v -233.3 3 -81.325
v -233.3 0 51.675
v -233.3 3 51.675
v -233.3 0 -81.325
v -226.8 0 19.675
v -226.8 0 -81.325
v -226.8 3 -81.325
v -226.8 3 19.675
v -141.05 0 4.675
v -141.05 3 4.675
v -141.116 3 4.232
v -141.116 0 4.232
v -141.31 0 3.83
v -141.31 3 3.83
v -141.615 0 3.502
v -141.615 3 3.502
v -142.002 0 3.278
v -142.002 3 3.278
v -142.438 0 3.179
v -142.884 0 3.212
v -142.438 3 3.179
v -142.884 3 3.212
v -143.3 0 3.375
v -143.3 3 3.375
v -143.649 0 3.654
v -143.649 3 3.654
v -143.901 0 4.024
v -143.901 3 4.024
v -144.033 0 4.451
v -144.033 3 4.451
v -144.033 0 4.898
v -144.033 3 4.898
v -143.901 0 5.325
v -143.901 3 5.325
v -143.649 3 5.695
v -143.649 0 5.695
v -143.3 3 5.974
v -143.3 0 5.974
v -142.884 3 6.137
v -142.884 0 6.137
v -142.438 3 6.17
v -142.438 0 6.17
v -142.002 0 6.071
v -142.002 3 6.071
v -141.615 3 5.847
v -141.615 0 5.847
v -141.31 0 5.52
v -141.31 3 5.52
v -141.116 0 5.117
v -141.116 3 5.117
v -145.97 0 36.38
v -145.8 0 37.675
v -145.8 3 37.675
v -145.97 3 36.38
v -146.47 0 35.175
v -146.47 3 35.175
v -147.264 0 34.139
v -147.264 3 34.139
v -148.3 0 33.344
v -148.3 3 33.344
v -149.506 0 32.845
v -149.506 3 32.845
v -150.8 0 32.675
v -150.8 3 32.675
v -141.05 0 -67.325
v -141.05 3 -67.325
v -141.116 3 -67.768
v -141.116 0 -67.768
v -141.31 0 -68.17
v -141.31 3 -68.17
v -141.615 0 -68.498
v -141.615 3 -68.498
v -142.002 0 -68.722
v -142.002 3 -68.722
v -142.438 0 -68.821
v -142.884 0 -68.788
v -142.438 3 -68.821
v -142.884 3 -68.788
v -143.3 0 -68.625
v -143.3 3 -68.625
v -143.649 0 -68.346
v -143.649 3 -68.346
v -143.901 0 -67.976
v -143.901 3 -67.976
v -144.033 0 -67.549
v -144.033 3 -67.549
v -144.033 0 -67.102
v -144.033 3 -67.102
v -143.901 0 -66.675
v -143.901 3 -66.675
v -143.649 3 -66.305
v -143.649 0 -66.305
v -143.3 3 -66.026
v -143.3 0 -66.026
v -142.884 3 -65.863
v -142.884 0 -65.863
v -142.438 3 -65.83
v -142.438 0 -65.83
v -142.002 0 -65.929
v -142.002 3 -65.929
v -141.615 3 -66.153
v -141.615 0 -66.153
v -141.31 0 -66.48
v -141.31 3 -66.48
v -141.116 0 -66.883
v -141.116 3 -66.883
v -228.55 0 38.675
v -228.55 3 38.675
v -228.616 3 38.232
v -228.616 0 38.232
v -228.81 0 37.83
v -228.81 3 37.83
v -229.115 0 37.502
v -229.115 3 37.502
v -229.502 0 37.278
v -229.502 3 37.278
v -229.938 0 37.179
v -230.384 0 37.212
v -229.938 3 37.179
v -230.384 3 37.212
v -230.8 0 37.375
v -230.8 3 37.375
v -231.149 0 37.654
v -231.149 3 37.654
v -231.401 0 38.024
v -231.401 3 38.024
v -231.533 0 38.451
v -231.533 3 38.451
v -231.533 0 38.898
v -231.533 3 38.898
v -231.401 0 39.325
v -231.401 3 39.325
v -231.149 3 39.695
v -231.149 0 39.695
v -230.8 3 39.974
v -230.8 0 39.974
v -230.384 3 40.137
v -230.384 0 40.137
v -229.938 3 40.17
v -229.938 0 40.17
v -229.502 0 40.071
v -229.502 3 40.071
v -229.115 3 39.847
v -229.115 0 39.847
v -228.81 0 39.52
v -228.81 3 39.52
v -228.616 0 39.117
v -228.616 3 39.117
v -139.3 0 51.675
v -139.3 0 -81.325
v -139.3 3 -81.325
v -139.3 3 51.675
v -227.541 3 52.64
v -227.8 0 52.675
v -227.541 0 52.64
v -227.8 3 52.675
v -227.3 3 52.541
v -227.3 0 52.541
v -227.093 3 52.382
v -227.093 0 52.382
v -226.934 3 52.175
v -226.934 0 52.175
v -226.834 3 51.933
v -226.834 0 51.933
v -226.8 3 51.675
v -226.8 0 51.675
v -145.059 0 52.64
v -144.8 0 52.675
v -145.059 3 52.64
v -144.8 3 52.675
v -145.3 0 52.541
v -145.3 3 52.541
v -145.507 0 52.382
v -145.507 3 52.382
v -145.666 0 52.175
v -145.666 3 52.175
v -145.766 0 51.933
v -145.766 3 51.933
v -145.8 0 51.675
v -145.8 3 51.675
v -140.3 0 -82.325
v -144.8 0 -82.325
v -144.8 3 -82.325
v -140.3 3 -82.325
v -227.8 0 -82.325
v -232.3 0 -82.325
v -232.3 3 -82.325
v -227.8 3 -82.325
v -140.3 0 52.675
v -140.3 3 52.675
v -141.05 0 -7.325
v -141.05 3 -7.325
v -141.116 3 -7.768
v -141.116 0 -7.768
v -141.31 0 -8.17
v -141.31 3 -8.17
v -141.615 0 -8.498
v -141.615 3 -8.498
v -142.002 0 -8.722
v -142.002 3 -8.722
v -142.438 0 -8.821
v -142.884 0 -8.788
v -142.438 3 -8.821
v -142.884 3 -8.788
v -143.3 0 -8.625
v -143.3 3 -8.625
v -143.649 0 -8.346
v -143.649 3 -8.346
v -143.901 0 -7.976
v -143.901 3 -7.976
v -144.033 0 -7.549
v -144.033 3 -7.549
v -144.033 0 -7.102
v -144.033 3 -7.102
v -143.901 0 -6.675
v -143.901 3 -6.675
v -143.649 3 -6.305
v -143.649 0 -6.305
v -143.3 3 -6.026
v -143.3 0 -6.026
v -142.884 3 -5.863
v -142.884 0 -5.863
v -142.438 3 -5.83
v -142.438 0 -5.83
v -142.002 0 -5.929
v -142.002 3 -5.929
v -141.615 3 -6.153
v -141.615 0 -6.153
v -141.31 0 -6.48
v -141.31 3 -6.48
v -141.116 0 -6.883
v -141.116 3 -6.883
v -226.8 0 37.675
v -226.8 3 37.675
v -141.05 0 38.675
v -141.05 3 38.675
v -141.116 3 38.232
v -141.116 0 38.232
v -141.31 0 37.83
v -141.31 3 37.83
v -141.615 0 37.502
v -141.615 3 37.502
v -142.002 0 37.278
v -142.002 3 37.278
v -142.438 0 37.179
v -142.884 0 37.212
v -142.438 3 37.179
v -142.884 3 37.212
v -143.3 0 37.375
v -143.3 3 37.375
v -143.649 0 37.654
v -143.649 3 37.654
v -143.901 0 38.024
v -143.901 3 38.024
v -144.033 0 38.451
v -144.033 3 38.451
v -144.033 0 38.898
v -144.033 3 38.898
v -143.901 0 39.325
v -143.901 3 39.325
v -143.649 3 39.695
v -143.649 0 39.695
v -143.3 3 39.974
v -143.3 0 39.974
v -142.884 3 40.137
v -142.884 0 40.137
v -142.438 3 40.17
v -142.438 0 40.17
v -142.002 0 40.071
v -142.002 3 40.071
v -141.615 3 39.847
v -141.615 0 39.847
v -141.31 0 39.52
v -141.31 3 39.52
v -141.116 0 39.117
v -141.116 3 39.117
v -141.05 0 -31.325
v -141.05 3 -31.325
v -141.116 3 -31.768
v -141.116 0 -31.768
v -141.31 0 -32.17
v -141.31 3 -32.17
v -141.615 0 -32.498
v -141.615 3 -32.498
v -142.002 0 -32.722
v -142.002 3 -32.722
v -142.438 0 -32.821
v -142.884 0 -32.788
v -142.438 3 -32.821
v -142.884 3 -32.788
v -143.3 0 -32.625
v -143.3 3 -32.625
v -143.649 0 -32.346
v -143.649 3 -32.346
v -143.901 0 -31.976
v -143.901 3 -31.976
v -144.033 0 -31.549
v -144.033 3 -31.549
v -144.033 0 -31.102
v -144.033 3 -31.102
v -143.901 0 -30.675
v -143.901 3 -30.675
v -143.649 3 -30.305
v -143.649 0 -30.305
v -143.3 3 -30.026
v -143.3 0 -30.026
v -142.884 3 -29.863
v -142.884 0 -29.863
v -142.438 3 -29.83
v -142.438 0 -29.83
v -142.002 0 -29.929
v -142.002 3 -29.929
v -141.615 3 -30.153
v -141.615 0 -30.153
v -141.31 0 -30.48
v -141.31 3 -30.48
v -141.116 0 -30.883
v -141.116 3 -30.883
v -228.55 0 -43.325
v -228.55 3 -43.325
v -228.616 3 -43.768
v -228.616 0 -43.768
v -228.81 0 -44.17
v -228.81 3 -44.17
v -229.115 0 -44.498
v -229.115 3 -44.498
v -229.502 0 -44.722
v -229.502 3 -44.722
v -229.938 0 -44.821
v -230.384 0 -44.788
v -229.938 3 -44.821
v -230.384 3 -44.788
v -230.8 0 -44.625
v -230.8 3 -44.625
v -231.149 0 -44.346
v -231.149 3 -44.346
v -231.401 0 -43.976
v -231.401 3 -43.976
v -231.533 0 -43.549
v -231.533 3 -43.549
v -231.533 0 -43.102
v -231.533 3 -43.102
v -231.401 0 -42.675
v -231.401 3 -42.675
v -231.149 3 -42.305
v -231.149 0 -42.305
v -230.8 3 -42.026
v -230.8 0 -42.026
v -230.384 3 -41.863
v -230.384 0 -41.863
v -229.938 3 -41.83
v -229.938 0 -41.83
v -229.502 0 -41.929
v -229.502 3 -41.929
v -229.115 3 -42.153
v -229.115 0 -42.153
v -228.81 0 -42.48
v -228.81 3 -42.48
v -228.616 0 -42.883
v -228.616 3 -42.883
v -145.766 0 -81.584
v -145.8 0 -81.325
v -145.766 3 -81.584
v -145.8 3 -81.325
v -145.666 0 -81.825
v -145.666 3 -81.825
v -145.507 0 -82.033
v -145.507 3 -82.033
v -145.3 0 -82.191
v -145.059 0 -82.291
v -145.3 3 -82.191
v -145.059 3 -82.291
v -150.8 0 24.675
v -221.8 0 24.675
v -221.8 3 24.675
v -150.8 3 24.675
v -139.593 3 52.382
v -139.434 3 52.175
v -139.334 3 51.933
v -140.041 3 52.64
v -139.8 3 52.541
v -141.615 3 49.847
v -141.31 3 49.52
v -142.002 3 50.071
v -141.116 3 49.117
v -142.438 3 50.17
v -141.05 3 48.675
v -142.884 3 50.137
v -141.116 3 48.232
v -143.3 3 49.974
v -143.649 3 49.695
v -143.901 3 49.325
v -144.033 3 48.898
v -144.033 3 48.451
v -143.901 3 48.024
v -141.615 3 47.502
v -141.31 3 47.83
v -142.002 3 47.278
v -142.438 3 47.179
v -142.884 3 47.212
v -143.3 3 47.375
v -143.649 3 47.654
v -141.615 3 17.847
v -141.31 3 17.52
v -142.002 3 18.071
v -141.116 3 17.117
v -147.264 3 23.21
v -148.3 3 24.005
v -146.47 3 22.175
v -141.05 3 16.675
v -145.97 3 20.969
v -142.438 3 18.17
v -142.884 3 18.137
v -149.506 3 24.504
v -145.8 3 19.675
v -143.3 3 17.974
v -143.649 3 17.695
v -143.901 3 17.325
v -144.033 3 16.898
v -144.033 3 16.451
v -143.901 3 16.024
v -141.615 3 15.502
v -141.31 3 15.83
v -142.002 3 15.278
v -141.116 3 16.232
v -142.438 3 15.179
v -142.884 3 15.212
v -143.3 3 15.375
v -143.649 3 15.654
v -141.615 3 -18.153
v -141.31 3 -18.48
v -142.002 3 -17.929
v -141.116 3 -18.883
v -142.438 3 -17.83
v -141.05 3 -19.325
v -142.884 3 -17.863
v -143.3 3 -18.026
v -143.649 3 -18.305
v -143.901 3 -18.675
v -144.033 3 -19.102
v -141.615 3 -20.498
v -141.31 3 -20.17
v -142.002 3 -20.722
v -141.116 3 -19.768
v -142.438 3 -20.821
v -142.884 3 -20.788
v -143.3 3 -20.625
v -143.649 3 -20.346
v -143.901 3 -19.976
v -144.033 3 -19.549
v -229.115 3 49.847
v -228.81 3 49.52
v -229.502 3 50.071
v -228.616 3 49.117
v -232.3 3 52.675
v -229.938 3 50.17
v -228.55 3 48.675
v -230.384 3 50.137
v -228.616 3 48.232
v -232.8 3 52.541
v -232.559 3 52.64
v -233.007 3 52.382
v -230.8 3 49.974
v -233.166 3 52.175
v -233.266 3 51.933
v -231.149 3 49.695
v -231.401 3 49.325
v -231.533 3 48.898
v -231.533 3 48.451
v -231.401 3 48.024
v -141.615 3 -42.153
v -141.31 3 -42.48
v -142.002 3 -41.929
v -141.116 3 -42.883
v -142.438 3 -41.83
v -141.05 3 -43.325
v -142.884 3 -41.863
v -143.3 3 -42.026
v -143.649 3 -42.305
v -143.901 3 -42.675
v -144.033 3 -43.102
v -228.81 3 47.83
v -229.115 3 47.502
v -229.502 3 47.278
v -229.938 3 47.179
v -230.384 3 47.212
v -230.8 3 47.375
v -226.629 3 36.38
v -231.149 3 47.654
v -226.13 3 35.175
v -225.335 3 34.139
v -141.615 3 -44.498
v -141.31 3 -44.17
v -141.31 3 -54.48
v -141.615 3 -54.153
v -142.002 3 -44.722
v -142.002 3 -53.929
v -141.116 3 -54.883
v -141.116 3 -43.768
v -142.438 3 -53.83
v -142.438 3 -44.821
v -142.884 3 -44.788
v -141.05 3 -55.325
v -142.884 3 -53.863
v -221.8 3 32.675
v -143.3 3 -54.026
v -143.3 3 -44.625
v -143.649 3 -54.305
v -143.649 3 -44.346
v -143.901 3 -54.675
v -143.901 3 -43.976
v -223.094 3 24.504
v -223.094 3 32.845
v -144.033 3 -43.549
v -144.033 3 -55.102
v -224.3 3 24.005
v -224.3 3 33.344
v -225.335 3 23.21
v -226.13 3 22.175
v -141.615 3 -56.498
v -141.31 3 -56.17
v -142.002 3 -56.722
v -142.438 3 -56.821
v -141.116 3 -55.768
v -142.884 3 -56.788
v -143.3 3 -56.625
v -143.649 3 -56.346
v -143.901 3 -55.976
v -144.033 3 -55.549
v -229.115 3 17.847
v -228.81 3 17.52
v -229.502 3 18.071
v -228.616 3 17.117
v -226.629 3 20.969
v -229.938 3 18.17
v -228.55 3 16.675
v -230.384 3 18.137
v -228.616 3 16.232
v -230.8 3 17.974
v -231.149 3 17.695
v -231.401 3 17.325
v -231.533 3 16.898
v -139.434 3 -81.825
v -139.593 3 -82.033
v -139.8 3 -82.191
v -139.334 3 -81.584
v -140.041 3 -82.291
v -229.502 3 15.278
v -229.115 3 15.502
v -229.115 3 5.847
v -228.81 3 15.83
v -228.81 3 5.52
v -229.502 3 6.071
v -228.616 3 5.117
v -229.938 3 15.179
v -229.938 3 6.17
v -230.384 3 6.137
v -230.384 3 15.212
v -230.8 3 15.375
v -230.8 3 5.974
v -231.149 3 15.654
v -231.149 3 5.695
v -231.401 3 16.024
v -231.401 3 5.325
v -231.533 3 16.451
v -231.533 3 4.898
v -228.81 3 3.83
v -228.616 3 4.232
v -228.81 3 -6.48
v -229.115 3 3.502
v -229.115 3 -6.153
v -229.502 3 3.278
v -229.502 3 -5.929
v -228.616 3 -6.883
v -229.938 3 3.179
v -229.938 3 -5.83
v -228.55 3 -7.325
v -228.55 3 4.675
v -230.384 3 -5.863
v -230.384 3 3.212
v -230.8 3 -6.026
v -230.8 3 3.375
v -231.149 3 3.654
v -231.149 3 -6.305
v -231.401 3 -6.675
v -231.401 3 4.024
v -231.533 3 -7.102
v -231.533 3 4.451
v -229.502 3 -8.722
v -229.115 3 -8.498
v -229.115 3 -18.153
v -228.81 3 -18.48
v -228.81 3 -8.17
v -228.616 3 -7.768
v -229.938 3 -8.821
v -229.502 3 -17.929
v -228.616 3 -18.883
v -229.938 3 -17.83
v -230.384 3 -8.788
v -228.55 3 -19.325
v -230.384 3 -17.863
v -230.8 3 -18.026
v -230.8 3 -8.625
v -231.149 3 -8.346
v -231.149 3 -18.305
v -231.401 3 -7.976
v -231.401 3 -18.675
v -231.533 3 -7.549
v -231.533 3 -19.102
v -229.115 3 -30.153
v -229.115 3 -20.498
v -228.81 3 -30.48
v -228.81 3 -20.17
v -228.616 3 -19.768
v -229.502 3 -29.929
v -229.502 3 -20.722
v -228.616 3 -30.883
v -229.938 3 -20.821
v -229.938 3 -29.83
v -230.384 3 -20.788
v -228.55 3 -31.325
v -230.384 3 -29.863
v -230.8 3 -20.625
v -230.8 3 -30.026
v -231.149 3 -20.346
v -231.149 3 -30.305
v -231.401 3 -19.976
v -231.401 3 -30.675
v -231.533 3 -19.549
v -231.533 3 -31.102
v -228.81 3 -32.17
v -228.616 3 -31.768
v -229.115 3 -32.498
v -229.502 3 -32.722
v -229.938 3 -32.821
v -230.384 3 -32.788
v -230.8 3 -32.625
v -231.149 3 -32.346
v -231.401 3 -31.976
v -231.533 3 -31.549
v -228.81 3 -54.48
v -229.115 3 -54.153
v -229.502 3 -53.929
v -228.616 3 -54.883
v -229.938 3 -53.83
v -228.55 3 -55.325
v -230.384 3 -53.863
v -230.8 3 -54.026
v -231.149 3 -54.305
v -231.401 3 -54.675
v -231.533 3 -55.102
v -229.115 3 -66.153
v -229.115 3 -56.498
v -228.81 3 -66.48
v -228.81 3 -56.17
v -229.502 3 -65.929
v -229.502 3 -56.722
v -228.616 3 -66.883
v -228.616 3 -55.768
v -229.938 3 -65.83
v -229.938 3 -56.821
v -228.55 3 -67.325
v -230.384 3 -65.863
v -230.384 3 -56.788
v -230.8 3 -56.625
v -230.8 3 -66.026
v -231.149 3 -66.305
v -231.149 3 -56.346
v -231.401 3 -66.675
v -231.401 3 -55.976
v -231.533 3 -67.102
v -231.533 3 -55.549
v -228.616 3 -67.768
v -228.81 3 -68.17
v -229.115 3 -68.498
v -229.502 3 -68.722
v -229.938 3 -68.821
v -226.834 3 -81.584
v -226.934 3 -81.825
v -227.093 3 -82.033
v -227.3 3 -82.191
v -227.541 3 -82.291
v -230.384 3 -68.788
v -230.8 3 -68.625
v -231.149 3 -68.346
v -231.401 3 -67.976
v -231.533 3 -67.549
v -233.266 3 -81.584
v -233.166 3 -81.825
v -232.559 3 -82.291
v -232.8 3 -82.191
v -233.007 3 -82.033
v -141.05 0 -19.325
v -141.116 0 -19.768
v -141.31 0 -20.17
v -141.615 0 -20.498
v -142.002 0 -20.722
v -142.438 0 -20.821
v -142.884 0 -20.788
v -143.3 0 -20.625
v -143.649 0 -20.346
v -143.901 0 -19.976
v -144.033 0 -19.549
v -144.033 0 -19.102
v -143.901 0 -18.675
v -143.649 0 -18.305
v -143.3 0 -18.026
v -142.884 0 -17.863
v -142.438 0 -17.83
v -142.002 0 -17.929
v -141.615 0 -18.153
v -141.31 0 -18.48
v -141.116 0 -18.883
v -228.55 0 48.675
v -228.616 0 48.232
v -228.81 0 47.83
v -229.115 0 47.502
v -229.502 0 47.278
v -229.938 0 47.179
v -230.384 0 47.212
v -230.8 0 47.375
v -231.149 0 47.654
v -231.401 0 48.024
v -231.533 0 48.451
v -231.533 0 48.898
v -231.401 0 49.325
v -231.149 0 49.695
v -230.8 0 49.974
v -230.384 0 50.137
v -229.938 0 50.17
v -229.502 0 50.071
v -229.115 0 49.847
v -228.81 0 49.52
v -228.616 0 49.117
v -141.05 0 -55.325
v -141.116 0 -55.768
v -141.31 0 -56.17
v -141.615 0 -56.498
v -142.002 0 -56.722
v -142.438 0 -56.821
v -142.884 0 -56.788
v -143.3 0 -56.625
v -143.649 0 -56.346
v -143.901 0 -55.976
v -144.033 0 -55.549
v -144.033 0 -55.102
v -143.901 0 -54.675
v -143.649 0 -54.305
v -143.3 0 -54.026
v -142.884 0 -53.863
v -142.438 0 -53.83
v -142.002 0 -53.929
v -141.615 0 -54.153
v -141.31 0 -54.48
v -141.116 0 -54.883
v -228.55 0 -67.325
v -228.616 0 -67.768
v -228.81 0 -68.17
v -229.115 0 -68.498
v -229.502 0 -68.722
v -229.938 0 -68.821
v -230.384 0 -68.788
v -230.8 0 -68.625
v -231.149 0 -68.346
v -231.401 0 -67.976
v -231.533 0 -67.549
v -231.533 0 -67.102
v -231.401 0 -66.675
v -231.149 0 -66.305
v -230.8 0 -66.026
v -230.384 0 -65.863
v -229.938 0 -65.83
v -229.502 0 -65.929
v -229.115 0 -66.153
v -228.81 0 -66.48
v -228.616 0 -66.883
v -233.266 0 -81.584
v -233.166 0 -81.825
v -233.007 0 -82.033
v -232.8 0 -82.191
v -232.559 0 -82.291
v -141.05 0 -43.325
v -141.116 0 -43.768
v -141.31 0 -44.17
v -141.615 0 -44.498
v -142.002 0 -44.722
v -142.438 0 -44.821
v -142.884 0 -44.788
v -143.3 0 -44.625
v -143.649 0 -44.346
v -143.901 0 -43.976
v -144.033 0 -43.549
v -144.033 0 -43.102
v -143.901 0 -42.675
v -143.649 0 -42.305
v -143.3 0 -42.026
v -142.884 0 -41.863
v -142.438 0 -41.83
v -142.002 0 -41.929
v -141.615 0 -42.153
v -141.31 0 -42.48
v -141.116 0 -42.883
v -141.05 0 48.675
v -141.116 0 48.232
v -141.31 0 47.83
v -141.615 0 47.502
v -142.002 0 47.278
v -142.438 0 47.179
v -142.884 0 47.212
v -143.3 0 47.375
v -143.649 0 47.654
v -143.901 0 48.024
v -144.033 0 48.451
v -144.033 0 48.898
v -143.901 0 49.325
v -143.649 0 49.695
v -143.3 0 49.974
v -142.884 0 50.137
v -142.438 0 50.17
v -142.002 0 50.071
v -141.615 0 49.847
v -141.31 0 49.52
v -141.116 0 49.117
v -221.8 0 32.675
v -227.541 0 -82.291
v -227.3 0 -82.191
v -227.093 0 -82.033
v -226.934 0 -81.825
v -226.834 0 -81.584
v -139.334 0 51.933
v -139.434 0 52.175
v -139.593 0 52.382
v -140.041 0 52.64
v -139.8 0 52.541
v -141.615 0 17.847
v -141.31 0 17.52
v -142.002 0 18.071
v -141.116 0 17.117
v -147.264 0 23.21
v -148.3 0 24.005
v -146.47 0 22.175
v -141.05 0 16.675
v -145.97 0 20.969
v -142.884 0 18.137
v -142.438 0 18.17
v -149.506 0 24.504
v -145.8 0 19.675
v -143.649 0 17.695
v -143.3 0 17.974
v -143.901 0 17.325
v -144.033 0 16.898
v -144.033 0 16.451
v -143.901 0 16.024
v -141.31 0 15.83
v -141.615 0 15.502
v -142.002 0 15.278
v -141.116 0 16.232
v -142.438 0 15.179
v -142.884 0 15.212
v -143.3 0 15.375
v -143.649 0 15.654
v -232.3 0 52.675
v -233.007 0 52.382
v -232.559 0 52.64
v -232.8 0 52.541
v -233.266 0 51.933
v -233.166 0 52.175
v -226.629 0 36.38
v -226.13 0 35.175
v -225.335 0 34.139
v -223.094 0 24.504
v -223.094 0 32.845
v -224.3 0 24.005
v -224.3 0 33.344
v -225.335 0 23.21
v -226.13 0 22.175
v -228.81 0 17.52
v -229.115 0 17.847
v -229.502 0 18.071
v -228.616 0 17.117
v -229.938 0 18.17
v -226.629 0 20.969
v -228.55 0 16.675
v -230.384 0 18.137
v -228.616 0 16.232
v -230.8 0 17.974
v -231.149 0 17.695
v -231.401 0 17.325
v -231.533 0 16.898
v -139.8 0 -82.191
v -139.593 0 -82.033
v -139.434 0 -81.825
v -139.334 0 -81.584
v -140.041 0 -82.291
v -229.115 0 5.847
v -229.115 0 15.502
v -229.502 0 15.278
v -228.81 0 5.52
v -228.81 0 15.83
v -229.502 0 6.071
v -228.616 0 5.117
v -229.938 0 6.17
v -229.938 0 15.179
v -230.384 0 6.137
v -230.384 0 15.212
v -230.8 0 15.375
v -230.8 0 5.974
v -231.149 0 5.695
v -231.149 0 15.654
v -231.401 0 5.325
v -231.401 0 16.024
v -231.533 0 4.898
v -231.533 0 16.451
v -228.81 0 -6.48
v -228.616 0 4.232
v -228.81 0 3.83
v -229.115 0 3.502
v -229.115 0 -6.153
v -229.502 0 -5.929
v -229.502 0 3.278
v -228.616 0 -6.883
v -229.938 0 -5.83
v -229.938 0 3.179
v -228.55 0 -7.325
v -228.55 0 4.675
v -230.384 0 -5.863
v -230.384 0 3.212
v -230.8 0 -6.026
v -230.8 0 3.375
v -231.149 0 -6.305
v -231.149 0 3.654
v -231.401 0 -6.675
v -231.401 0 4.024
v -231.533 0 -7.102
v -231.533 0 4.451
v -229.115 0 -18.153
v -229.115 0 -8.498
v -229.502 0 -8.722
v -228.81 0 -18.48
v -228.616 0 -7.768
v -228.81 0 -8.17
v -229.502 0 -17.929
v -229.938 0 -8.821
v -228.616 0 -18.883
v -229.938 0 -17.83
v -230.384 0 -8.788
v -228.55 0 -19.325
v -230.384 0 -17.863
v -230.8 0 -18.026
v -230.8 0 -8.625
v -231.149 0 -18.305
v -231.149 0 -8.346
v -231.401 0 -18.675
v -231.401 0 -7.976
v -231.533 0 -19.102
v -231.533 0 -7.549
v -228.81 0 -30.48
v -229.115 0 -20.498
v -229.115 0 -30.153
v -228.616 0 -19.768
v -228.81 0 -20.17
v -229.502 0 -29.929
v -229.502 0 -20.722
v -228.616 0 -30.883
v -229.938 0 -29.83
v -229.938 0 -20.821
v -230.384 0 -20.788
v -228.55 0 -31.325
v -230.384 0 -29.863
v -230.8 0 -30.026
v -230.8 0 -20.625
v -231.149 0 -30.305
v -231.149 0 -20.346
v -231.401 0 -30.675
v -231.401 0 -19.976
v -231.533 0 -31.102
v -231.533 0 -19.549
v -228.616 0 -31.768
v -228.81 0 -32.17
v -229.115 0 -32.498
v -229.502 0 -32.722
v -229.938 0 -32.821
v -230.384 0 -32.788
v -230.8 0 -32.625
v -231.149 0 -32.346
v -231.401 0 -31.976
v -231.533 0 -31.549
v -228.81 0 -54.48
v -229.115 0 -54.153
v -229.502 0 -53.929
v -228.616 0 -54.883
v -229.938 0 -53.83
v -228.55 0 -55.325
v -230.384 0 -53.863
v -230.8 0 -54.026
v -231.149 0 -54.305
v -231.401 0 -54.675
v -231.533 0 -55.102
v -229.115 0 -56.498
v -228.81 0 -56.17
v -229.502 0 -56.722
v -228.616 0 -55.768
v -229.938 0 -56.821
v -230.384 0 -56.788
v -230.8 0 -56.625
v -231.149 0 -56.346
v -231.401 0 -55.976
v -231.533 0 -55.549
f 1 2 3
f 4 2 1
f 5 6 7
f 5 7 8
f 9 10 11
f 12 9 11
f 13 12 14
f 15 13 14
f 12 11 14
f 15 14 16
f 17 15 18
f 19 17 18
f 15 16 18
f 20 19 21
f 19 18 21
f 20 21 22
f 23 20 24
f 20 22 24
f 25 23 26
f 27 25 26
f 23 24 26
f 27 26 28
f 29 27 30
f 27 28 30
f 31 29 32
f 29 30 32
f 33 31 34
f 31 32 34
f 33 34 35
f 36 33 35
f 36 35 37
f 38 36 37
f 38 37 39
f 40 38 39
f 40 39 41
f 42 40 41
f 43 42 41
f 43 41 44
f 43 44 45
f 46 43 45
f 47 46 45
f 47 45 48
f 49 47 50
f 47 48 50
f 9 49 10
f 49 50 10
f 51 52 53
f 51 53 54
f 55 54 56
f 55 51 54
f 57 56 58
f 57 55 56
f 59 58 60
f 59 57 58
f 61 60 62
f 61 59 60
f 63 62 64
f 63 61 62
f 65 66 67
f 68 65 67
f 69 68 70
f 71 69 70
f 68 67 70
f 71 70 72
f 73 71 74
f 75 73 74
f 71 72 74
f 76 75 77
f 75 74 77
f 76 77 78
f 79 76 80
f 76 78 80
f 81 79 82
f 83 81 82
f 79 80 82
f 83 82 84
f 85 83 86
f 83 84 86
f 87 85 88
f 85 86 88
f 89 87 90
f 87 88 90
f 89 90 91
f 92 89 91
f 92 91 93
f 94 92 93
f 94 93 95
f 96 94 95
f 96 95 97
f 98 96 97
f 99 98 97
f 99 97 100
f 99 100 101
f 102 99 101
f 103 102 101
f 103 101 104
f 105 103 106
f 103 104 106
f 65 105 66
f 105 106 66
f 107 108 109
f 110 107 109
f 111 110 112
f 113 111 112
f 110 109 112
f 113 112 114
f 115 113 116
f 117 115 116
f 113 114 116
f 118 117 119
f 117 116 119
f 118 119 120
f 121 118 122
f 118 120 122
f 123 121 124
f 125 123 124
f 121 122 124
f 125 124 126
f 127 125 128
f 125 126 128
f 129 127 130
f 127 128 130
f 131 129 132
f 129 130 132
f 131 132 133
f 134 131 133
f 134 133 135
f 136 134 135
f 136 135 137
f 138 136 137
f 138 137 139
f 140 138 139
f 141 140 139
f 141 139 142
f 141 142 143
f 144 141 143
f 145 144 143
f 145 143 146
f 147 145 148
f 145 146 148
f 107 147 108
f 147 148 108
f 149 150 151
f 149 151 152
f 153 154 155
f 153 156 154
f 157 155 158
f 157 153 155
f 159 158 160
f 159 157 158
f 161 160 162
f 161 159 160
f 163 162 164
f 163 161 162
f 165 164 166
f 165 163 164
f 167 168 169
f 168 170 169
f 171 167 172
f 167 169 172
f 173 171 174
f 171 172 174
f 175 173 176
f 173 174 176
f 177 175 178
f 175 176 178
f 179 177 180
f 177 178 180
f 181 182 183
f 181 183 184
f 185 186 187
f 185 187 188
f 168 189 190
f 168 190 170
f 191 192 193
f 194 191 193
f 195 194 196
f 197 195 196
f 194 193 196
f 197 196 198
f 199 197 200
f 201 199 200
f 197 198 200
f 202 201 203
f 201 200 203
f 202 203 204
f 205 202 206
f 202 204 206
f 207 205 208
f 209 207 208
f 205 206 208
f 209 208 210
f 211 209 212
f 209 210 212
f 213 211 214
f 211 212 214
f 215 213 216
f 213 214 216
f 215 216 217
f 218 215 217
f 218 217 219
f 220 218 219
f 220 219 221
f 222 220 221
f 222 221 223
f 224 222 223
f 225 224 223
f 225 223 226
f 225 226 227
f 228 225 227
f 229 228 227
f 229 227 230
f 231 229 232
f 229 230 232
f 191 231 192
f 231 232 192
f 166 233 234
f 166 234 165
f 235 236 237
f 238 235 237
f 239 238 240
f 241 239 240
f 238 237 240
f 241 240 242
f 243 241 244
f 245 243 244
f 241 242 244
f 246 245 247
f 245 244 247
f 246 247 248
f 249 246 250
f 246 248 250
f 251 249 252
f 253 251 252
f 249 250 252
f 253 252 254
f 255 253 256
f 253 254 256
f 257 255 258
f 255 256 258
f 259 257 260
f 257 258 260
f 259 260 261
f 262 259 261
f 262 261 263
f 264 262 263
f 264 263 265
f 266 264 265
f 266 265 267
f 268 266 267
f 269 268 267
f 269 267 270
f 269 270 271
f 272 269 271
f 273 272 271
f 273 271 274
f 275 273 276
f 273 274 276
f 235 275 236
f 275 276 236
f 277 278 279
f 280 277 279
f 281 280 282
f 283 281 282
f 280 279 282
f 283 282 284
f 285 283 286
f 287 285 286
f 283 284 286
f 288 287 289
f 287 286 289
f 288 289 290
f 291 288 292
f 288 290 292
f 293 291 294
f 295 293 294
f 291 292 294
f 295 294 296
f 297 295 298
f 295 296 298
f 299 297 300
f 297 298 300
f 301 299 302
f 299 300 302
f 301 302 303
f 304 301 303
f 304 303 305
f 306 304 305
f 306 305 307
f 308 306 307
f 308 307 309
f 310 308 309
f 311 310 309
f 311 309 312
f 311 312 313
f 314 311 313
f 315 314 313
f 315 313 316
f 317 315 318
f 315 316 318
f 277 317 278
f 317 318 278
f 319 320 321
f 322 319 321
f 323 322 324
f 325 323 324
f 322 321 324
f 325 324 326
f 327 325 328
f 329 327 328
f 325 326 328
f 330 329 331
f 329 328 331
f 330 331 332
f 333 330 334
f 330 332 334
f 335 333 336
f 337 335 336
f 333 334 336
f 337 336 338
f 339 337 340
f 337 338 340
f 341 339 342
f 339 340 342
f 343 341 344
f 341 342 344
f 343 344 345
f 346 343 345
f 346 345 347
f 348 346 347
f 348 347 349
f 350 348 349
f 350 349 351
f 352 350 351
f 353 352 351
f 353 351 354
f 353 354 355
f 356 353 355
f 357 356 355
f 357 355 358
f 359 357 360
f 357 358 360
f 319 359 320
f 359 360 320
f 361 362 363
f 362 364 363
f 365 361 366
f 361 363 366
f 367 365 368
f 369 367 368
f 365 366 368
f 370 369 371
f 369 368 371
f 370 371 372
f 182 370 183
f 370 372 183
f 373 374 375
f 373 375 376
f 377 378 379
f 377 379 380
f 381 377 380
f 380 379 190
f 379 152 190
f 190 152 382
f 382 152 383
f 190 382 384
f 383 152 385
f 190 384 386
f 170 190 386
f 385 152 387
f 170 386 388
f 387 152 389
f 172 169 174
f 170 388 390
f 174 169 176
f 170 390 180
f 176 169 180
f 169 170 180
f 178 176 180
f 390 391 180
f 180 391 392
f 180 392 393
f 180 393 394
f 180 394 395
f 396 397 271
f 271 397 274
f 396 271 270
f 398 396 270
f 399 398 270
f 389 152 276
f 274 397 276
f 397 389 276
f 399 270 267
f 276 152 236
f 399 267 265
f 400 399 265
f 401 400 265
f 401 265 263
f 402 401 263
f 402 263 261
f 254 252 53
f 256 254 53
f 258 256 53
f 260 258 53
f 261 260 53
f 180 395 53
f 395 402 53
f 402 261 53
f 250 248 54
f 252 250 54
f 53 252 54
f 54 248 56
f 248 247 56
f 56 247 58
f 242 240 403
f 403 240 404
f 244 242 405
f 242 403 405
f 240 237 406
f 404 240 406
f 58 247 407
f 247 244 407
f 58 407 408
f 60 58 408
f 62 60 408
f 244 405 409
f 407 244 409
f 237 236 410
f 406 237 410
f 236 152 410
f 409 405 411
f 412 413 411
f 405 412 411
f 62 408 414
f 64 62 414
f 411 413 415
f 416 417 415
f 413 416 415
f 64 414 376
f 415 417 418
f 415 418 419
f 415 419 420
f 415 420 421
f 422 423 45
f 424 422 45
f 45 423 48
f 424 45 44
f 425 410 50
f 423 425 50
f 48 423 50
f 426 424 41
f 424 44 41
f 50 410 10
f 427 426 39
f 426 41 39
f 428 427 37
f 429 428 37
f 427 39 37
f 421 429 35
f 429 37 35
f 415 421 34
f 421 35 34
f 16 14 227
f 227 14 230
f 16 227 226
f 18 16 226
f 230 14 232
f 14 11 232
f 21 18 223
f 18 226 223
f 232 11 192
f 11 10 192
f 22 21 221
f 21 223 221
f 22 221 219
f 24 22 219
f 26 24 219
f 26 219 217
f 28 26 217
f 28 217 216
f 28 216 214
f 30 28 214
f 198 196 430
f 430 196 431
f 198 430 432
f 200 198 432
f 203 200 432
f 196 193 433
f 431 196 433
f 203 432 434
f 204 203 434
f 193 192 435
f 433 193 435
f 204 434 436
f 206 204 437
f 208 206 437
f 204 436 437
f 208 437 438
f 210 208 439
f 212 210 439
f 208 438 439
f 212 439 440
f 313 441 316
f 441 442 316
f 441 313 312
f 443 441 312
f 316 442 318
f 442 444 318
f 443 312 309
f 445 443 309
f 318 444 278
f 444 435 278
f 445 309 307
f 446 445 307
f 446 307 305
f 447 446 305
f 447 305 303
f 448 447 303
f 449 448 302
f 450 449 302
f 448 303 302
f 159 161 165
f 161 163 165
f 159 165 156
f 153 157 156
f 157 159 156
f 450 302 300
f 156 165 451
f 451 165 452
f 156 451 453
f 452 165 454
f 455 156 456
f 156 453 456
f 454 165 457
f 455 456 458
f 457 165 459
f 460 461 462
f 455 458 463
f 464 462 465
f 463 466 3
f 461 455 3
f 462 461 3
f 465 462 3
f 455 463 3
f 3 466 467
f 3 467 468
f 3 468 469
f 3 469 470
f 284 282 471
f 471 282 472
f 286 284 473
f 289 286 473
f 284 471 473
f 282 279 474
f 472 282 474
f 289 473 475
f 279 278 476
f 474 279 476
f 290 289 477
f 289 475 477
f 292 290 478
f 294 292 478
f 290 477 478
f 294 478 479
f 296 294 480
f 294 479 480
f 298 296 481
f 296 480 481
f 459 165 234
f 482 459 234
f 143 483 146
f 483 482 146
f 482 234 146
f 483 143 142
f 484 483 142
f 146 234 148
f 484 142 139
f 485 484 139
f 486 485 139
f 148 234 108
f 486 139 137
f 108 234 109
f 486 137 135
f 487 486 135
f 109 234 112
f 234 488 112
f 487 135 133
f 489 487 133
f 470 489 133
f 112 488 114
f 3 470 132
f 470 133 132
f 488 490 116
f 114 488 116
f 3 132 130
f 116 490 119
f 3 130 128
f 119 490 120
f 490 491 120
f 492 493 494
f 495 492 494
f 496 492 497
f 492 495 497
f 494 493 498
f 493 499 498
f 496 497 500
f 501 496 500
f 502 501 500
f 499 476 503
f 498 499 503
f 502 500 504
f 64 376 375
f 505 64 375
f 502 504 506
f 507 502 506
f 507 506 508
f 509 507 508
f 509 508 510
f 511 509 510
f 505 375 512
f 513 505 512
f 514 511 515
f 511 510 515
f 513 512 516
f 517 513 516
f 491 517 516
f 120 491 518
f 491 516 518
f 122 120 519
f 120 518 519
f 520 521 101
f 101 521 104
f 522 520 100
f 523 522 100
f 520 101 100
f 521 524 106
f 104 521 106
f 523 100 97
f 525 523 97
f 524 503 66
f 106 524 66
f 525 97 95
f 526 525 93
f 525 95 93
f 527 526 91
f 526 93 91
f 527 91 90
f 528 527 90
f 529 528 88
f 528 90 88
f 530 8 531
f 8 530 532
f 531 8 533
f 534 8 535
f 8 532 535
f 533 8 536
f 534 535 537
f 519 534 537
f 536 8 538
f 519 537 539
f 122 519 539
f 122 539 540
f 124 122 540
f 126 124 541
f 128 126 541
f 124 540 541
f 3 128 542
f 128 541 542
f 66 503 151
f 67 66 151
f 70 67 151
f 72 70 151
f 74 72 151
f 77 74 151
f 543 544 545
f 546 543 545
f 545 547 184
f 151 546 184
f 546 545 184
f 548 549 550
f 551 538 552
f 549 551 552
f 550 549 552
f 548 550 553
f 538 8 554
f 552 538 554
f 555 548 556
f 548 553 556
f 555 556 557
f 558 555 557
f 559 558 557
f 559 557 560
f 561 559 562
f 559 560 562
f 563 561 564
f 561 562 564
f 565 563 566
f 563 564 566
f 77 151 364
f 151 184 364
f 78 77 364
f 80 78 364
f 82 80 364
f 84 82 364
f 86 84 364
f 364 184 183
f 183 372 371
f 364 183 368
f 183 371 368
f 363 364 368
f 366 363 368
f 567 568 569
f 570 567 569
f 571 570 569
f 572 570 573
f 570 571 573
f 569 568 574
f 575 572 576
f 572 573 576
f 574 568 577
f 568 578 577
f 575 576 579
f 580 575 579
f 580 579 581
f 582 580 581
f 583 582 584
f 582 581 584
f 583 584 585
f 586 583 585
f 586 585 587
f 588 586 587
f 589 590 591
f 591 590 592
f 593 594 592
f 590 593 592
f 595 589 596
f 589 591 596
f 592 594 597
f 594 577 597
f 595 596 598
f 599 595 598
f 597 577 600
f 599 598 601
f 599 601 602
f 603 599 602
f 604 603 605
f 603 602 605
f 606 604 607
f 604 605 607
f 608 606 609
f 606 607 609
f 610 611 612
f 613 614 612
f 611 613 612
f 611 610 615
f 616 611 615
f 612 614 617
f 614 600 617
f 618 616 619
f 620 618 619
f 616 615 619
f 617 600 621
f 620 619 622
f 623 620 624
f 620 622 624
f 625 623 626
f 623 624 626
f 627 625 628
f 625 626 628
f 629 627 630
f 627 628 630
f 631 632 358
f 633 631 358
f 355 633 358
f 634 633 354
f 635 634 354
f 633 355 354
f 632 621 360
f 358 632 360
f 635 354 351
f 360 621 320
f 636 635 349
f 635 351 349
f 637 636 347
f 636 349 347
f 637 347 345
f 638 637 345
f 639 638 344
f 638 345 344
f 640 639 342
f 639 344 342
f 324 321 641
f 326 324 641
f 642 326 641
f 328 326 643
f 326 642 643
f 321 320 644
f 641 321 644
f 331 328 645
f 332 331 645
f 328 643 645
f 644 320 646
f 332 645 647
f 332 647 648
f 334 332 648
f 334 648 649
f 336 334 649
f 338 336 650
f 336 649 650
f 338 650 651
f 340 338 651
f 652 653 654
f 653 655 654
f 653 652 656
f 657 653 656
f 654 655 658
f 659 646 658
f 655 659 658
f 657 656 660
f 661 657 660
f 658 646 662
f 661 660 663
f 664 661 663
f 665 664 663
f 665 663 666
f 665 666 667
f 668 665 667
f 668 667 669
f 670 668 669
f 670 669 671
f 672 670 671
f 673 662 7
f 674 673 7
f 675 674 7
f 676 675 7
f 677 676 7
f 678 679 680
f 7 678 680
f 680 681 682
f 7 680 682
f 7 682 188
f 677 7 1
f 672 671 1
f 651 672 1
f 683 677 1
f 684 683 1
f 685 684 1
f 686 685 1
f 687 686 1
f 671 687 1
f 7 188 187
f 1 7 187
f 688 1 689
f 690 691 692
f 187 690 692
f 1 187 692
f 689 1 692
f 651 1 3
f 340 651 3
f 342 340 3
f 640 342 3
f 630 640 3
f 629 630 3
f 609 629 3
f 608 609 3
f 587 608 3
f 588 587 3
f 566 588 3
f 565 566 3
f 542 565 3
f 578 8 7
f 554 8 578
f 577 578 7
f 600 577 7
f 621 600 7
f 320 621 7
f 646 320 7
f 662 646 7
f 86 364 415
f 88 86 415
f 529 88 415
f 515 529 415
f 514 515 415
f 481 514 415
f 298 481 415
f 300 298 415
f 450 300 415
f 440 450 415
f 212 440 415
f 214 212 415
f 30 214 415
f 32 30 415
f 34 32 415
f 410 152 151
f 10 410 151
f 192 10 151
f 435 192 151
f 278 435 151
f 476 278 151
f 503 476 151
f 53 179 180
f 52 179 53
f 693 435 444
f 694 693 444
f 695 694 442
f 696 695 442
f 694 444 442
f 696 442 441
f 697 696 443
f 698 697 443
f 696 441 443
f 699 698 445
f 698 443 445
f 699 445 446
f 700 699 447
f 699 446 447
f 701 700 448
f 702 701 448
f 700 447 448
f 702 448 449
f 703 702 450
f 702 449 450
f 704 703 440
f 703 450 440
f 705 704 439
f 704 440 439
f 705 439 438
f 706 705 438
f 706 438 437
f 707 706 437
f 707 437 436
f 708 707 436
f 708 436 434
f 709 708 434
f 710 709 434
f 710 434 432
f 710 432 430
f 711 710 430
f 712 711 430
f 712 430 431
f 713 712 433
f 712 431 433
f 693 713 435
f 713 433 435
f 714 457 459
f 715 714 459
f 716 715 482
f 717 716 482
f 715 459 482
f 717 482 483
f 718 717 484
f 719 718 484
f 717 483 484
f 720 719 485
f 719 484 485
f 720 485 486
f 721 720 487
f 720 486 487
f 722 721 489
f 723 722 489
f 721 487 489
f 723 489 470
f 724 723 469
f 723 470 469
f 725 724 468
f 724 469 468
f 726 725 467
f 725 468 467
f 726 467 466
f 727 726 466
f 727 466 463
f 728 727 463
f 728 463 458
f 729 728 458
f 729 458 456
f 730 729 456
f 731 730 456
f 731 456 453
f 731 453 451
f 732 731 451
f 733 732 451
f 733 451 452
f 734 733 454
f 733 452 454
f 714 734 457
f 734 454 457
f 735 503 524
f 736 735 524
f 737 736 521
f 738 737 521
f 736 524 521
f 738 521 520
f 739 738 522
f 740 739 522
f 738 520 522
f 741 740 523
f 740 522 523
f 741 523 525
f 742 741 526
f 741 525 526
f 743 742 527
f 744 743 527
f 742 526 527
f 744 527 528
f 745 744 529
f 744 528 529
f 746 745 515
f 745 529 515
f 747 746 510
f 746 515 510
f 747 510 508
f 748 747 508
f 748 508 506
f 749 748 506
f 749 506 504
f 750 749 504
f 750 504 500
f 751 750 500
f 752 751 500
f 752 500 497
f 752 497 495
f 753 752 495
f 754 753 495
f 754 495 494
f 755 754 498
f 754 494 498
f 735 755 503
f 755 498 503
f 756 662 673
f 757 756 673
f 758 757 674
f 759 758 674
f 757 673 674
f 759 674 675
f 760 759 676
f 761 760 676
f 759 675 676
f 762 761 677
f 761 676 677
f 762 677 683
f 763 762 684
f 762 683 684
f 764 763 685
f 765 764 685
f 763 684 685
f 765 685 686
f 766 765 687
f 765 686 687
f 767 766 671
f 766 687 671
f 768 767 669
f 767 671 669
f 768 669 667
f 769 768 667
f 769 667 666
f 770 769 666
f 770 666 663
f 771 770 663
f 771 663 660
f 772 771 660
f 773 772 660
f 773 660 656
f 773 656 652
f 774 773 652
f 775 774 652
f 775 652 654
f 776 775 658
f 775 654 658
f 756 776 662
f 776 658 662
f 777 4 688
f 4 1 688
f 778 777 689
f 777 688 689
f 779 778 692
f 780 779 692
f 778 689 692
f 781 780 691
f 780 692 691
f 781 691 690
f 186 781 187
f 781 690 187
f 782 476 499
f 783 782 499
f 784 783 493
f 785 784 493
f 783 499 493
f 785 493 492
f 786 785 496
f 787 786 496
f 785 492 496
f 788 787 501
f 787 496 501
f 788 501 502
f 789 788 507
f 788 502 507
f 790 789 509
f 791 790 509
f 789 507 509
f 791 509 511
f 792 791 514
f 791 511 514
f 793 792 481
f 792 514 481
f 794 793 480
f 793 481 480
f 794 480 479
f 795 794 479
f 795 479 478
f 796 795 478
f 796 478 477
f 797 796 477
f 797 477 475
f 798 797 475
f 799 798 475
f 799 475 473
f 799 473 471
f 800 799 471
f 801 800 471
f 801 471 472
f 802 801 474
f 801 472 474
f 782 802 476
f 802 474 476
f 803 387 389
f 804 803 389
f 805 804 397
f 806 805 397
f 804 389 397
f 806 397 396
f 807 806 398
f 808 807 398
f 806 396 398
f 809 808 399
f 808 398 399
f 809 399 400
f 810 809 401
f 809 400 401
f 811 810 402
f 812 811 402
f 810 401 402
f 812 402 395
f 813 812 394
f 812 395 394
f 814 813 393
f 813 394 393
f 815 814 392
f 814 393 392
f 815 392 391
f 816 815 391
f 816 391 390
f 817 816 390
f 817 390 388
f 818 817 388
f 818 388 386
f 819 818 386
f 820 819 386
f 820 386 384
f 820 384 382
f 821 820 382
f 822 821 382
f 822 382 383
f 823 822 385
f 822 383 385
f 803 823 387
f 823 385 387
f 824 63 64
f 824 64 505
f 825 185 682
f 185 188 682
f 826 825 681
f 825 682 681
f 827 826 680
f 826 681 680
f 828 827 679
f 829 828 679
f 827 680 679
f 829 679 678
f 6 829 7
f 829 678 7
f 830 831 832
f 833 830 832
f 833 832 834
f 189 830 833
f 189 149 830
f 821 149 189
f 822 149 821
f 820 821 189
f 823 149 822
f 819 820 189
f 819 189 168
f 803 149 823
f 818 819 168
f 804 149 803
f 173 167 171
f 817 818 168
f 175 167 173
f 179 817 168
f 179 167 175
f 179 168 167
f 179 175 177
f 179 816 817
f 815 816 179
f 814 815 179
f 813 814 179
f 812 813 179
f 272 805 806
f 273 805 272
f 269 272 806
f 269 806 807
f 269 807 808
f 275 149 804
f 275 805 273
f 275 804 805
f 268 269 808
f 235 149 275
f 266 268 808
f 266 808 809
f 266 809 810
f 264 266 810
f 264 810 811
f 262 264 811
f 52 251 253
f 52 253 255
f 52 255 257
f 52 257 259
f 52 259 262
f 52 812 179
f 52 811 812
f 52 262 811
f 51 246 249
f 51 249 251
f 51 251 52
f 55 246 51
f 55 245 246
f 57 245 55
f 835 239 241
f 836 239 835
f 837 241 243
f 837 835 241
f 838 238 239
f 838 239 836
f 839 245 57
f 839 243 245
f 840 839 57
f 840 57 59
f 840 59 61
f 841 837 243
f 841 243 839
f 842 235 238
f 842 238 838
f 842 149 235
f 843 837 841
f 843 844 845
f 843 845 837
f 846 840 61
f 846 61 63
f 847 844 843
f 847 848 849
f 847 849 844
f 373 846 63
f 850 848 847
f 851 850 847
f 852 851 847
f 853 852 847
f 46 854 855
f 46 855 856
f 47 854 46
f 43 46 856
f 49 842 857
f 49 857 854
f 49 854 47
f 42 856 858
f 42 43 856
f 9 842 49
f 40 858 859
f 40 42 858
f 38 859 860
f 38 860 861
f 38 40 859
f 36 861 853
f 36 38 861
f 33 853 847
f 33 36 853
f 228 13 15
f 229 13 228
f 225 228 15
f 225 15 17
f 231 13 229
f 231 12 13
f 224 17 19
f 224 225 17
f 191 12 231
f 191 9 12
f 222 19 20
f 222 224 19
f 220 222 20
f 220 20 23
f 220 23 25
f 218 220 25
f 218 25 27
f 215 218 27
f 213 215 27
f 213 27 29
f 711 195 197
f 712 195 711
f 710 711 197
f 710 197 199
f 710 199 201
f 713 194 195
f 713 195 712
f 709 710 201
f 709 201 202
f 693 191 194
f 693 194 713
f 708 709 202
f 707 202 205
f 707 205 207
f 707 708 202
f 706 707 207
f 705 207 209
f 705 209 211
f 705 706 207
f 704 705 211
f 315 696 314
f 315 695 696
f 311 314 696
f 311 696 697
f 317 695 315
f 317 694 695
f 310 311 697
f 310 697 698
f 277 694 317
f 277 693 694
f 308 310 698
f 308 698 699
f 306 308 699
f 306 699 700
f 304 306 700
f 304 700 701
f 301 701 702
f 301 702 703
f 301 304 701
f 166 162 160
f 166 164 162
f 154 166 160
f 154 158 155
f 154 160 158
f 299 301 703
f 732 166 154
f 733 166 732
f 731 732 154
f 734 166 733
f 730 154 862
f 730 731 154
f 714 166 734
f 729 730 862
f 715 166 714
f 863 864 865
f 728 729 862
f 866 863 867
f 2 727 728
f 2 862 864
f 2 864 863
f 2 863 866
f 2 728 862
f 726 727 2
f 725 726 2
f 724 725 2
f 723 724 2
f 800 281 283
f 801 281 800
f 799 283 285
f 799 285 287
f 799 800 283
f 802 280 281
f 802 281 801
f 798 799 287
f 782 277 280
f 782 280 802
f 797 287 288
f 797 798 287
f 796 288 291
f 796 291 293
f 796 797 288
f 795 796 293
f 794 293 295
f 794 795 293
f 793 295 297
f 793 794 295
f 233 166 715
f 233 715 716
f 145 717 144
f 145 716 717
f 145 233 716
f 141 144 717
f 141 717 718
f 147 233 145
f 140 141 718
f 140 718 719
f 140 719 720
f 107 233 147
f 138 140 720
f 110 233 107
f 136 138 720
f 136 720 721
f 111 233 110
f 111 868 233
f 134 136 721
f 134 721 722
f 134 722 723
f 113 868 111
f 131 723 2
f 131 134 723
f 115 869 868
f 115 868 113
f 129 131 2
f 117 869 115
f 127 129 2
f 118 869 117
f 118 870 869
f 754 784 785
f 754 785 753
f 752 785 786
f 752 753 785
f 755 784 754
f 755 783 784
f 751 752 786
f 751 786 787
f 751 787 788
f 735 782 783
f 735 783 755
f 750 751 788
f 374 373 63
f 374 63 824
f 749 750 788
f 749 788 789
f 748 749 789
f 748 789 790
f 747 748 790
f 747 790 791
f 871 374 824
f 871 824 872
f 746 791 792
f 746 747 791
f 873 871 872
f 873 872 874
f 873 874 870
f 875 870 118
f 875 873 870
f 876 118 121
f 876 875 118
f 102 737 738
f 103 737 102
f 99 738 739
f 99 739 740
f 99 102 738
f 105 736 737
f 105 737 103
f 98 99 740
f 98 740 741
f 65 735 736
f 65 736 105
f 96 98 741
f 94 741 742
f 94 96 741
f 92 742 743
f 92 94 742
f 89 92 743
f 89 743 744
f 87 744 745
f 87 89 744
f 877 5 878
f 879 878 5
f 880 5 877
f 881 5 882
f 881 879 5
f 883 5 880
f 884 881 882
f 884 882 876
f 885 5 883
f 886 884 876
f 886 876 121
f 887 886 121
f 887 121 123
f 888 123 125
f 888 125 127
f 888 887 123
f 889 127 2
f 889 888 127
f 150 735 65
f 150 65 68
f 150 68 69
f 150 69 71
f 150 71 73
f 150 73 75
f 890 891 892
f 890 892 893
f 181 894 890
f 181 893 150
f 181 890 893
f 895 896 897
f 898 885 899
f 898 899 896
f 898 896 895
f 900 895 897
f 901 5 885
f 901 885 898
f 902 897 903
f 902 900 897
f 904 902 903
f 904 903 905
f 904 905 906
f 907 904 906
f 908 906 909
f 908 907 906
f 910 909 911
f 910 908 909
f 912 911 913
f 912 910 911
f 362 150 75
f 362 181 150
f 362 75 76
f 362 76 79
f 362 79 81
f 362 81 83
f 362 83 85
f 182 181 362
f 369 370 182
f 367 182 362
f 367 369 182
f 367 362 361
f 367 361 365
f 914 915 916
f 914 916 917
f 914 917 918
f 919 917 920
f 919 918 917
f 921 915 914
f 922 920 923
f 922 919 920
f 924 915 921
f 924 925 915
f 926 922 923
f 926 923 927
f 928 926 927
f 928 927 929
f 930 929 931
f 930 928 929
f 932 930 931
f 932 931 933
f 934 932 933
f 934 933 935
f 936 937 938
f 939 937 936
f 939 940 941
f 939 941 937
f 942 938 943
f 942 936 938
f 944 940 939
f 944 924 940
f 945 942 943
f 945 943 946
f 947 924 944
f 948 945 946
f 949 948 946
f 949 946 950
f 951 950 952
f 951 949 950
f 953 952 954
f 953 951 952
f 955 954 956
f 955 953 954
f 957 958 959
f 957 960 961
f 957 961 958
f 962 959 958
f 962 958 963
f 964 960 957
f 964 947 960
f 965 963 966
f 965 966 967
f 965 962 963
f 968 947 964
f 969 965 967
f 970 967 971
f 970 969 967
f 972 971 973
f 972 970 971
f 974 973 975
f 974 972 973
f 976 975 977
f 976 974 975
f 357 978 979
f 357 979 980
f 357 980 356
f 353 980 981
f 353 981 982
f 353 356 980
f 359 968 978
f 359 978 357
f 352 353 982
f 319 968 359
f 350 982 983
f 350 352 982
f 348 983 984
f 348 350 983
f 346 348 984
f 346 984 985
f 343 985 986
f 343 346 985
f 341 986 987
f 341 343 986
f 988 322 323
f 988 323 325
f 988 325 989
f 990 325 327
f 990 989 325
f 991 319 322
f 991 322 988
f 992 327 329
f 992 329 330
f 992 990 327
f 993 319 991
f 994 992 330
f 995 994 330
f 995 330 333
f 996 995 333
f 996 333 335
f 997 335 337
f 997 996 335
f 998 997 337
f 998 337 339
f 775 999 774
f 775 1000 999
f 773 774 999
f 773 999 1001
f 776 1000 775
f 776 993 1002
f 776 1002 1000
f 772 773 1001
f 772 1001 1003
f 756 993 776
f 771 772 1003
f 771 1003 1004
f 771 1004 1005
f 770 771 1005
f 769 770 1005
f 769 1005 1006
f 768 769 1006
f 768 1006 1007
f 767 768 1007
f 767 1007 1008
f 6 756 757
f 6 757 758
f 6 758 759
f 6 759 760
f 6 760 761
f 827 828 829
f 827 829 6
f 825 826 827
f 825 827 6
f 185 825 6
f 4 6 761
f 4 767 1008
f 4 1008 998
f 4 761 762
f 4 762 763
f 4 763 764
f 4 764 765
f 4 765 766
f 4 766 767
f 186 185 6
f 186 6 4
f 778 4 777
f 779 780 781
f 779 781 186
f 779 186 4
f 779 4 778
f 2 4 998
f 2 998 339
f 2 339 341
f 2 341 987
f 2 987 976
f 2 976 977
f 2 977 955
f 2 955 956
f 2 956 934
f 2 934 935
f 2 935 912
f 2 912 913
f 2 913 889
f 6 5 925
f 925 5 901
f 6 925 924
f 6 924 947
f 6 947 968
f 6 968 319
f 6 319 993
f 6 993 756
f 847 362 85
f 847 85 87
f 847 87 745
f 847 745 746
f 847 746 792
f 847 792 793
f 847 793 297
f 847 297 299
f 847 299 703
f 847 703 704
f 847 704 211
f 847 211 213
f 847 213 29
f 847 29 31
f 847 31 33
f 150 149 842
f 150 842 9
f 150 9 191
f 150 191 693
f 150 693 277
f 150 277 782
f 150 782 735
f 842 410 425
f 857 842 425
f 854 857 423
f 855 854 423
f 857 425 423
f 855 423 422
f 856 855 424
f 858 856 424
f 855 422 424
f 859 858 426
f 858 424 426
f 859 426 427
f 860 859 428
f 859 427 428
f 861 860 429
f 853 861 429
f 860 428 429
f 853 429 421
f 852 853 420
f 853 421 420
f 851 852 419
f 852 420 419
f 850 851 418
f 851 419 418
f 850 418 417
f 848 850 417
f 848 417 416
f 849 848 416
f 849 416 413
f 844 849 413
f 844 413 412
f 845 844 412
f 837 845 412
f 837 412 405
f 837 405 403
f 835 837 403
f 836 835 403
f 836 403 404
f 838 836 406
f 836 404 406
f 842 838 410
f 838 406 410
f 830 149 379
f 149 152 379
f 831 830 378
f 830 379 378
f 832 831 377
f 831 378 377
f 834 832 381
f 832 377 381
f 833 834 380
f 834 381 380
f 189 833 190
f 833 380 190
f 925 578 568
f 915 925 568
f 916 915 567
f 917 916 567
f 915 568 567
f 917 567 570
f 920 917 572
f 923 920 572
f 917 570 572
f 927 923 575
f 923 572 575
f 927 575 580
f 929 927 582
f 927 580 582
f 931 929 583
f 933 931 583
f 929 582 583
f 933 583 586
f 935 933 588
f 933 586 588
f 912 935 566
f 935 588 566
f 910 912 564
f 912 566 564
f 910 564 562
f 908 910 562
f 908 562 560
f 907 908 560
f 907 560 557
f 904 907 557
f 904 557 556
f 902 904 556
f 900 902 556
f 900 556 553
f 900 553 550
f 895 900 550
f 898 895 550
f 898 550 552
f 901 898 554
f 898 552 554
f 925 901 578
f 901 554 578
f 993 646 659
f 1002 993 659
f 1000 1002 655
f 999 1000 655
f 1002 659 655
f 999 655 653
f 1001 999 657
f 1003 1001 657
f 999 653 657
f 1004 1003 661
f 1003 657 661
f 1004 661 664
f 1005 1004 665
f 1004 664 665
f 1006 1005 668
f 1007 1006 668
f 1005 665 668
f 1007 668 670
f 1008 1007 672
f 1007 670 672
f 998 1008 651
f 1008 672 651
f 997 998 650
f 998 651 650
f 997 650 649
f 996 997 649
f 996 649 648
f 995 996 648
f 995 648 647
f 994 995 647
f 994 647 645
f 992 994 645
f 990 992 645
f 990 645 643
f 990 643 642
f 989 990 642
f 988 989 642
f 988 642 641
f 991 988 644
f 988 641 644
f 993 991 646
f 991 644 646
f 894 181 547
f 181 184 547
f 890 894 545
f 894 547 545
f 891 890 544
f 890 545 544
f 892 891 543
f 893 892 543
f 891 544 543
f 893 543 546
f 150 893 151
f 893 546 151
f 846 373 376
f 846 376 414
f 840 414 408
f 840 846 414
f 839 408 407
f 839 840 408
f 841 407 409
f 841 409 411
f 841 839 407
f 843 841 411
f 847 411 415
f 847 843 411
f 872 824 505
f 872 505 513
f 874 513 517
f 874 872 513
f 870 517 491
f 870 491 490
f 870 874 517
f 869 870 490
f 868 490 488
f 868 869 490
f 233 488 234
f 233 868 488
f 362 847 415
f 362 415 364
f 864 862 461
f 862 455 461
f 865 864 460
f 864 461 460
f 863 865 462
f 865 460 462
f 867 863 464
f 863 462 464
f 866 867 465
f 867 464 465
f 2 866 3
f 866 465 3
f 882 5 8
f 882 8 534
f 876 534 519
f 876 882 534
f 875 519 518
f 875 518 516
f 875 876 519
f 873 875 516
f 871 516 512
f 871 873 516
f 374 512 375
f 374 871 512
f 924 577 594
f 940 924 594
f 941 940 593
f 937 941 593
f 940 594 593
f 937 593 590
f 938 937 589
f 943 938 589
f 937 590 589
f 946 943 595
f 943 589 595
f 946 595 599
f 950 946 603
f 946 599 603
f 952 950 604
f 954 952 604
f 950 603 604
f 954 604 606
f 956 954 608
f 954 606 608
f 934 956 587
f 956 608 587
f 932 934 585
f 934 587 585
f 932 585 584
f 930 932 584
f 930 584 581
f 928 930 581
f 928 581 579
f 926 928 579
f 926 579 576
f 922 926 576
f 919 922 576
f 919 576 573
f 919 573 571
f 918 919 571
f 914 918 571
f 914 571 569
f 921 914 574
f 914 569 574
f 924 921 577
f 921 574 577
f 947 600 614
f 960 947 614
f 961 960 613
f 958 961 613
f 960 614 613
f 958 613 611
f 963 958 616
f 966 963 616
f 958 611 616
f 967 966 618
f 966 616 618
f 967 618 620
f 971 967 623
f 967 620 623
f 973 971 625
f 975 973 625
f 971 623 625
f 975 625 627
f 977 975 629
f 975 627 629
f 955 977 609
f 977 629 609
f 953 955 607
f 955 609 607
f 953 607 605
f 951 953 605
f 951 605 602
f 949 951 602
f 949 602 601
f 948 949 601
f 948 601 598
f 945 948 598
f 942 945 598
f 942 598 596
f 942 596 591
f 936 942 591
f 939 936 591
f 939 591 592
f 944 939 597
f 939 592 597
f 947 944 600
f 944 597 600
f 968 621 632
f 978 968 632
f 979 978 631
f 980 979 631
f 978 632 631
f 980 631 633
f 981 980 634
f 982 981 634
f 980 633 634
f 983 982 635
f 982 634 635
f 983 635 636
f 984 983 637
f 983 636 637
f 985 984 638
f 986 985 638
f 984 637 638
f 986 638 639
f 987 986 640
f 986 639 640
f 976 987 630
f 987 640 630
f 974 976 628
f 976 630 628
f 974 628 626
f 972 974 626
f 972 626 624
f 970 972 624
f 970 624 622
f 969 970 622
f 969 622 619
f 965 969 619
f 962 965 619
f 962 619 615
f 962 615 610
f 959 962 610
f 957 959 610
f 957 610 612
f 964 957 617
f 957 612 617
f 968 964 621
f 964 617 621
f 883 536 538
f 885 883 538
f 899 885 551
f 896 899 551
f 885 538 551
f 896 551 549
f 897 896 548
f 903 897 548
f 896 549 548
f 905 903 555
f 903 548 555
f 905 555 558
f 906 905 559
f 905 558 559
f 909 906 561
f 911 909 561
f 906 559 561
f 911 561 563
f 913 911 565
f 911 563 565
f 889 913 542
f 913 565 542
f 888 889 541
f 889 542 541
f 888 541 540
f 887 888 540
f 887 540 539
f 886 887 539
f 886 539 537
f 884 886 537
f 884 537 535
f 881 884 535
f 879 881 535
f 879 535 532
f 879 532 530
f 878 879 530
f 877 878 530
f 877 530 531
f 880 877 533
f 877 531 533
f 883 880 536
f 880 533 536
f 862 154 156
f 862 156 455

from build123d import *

# Parameters (mm, degrees)
BOSS_EXTRUDE1_DEPTH = 3
FILLET1_R           = 1
SKETCH2_R           = 1.5
CUT_EXTRUDE1_DEPTH  = 3


with BuildPart() as part:
    # Sketch1 → Boss-Extrude1 (new body)
    with BuildSketch(Plane(origin=(0, 0, 0), x_dir=(1, 0, 0), z_dir=(0, 1, 0))):
        with BuildLine():
            Line((-226.799741314, -52.674534602), (-233.299741314, -52.674534602))
            Line((-233.299741314, -52.674534602), (-233.299741314, 67.325465398))
            Line((-233.299741314, 67.325465398), (-233.299741314, 82.325465398))
            Line((-233.299741314, 82.325465398), (-226.799741314, 82.325465398))
            Line((-226.799741314, 82.325465398), (-226.799741314, 67.325465398))
            Line((-226.799741314, 67.325465398), (-226.799741314, -19.674534602))
            ThreePointArc((-226.799741314, -19.674534602), (-225.33527522, -23.210068508), (-221.799741314, -24.674534602))
            Line((-221.799741314, -24.674534602), (-150.799741314, -24.674534602))
            ThreePointArc((-150.799741314, -24.674534602), (-147.264207408, -23.210068508), (-145.799741314, -19.674534602))
            Line((-145.799741314, -19.674534602), (-145.799741314, 67.325465398))
            Line((-145.799741314, 67.325465398), (-145.799741314, 82.325465398))
            Line((-145.799741314, 82.325465398), (-139.299741314, 82.325465398))
            Line((-139.299741314, 82.325465398), (-139.299741314, 67.325465398))
            Line((-139.299741314, 67.325465398), (-139.299741314, -52.674534602))
            Line((-139.299741314, -52.674534602), (-145.799741314, -52.674534602))
            Line((-145.799741314, -52.674534602), (-145.799741314, -37.674534602))
            ThreePointArc((-145.799741314, -37.674534602), (-147.264207408, -34.139000697), (-150.799741314, -32.674534602))
            Line((-150.799741314, -32.674534602), (-221.799741314, -32.674534602))
            ThreePointArc((-221.799741314, -32.674534602), (-225.33527522, -34.139000697), (-226.799741314, -37.674534602))
            Line((-226.799741314, -37.674534602), (-226.799741314, -52.674534602))
        make_face()
    extrude(amount=BOSS_EXTRUDE1_DEPTH)

    # Fillet1
    fillet1_edges = [part.edges().sort_by_distance(p)[0] for p in [
        (-145.799741314, 1.5, -82.325465398),
        (-139.299741314, 1.5, -82.325465398),
        (-139.299741314, 1.5, 52.674534602),
        (-145.799741314, 1.5, 52.674534602),
        (-226.799741314, 1.5, 52.674534602),
        (-233.299741314, 1.5, 52.674534602),
        (-233.299741314, 1.5, -82.325465398),
        (-226.799741314, 1.5, -82.325465398),
    ]]
    fillet(fillet1_edges, radius=FILLET1_R)

    # Sketch2 → Cut-Extrude1 (cut)
    with BuildSketch(Plane(origin=(0, 3, 0), x_dir=(1, 0, 0), z_dir=(0, 1, 0))):
        with Locations((-230.049741314, 7.325465398)):
            Circle(SKETCH2_R)
        with Locations((-142.549741314, 7.325465398)):
            Circle(SKETCH2_R)
        with Locations((-230.049741314, 31.325465398)):
            Circle(SKETCH2_R)
        with Locations((-230.049741314, 55.325465398)):
            Circle(SKETCH2_R)
        with Locations((-230.049741314, 43.325465398)):
            Circle(SKETCH2_R)
        with Locations((-230.049741314, 19.325465398)):
            Circle(SKETCH2_R)
        with Locations((-230.049741314, -4.674534602)):
            Circle(SKETCH2_R)
        with Locations((-142.549741314, -4.674534602)):
            Circle(SKETCH2_R)
        with Locations((-230.049741314, -38.674534602)):
            Circle(SKETCH2_R)
        with Locations((-230.049741314, -48.674534602)):
            Circle(SKETCH2_R)
        with Locations((-142.549741314, -38.674534602)):
            Circle(SKETCH2_R)
        with Locations((-142.549741314, -48.674534602)):
            Circle(SKETCH2_R)
        with Locations((-142.549741314, 19.325465398)):
            Circle(SKETCH2_R)
        with Locations((-142.549741314, 31.325465398)):
            Circle(SKETCH2_R)
        with Locations((-142.549741314, 43.325465398)):
            Circle(SKETCH2_R)
        with Locations((-142.549741314, 55.325465398)):
            Circle(SKETCH2_R)
        with Locations((-230.049741314, -16.674534602)):
            Circle(SKETCH2_R)
        with Locations((-142.549741314, -16.674534602)):
            Circle(SKETCH2_R)
        with Locations((-230.049741314, 67.325465398)):
            Circle(SKETCH2_R)
        with Locations((-142.549741314, 67.325465398)):
            Circle(SKETCH2_R)
    extrude(amount=-CUT_EXTRUDE1_DEPTH, mode=Mode.SUBTRACT)


solid = part.part
